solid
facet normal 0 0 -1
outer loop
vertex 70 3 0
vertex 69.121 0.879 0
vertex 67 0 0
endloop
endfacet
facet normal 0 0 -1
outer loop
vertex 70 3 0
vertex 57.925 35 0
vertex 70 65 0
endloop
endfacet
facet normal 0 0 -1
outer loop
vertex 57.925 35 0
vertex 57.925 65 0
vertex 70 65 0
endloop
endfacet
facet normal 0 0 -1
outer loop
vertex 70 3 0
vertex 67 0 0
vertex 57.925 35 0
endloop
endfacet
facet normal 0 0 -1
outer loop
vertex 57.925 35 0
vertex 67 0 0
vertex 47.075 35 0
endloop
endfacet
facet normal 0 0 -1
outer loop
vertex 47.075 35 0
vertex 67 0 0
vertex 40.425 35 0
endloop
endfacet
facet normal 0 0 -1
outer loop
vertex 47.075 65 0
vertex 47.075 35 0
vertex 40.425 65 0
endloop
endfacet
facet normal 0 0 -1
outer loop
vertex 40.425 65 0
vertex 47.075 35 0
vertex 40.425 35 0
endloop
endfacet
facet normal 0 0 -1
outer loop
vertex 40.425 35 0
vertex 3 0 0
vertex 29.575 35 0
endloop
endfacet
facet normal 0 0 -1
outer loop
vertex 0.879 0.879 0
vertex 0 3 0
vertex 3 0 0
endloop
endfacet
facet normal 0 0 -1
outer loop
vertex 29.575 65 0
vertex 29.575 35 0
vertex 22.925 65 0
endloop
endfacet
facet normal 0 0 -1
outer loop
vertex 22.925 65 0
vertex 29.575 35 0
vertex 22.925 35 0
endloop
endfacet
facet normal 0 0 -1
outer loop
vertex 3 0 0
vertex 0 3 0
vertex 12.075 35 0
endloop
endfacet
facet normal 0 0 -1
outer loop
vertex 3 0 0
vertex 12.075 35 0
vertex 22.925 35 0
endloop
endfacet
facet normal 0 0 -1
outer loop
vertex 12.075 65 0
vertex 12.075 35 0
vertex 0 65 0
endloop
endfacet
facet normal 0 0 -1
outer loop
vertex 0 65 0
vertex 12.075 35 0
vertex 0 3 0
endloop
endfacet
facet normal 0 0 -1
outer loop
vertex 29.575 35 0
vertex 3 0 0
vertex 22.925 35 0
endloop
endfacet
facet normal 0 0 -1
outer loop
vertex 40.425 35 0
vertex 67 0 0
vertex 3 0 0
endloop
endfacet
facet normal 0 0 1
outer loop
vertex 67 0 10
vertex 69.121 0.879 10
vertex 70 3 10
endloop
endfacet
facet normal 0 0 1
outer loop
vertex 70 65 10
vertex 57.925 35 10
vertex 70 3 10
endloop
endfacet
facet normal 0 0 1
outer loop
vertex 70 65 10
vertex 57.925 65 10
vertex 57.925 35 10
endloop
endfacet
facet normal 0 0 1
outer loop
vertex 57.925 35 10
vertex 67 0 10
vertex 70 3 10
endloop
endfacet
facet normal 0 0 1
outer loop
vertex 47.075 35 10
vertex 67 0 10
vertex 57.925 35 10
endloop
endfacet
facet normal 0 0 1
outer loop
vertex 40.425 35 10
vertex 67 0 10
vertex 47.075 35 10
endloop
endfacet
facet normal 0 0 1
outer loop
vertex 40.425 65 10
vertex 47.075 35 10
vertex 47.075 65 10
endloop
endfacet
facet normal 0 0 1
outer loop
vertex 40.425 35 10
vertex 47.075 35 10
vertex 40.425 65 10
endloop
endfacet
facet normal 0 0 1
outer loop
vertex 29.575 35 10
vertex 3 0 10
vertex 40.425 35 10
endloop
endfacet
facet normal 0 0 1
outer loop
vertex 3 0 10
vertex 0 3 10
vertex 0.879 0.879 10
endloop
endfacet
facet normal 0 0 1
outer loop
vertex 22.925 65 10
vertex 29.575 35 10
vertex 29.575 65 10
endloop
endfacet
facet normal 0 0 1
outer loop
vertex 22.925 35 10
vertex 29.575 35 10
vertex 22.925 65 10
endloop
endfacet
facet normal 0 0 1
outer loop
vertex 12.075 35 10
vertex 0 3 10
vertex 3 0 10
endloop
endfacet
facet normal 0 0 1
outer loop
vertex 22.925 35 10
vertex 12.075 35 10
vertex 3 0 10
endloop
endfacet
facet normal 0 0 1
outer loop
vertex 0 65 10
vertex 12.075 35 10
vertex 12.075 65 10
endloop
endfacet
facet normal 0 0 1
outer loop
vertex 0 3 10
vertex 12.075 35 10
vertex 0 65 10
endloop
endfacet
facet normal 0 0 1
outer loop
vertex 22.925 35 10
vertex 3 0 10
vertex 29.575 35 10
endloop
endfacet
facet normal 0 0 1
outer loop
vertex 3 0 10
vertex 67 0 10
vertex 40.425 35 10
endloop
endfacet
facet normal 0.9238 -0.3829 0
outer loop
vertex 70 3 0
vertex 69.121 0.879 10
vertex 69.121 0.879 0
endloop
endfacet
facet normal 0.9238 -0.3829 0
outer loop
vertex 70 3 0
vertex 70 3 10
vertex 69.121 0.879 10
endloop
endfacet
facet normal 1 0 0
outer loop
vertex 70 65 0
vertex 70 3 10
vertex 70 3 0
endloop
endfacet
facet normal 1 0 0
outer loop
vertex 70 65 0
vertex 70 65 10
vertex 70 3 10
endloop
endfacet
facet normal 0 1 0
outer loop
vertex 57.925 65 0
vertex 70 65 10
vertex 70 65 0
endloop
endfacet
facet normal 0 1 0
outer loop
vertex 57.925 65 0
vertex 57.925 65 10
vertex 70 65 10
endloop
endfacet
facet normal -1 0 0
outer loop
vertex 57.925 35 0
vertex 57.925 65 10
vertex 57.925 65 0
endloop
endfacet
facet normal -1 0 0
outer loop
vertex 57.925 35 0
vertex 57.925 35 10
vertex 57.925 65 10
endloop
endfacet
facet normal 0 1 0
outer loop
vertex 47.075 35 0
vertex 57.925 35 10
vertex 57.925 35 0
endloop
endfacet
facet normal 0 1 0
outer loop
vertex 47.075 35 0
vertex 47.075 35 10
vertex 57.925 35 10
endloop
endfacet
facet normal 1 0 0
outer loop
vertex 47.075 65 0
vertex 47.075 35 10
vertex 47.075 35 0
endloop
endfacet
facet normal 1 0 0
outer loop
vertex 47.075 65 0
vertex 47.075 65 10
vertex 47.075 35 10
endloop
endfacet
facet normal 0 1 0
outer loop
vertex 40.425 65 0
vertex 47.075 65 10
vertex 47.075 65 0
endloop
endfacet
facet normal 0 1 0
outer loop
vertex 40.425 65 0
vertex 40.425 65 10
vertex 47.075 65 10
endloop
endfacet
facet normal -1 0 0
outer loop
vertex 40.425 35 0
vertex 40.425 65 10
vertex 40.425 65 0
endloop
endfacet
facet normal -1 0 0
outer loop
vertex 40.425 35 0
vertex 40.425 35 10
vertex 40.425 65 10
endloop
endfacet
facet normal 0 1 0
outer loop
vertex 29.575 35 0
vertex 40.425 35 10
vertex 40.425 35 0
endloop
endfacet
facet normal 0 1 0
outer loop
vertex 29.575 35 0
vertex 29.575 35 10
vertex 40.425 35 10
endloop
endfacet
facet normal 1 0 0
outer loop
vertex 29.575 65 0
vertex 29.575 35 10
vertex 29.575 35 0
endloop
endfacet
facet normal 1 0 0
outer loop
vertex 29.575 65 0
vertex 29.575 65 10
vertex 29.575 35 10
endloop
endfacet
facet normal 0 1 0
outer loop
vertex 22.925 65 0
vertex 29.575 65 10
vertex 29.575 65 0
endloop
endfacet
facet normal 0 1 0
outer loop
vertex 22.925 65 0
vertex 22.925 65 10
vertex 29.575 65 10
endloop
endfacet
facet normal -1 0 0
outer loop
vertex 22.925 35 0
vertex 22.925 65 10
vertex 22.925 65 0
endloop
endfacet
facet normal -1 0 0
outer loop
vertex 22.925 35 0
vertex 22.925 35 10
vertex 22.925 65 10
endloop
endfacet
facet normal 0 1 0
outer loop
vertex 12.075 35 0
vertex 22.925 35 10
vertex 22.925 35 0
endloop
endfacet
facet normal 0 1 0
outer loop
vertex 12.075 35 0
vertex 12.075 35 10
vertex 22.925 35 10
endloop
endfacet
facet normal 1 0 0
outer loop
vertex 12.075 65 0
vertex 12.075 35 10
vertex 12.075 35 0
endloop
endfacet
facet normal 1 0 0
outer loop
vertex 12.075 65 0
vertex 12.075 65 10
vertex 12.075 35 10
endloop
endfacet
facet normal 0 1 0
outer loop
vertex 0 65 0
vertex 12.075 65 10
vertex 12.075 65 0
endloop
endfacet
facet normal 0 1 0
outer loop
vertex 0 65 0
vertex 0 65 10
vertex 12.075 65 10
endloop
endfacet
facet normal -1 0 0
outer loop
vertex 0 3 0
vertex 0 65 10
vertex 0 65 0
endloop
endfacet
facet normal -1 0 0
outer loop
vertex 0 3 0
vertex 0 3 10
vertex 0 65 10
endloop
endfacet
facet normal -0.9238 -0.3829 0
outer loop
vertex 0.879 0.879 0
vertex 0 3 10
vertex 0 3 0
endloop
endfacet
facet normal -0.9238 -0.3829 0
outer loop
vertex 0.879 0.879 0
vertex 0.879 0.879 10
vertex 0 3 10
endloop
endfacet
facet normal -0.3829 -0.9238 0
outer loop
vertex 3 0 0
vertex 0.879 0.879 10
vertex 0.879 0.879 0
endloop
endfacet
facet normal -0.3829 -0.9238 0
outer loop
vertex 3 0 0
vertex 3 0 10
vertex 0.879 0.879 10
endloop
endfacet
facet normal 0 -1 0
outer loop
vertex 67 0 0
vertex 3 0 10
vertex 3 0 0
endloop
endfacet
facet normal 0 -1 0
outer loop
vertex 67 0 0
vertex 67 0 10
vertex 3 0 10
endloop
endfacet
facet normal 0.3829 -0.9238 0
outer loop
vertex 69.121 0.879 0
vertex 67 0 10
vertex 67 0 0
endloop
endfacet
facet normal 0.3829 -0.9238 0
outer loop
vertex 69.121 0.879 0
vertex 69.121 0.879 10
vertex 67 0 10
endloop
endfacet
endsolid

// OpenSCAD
$fn = 32;

// ----------------------------------------------------------------------
// Window plate: 70 x 65 mm, 3 open windows
// ----------------------------------------------------------------------

// --- parameters (mm) ---
profile_height = 10;      // extrusion height
profile_points = 20;      // points of the closed outline

profile = [[0, 3], [0.879, 0.879], [3, 0], [67, 0], [69.121, 0.879], [70, 3], [70, 65], [57.925, 65], [57.925, 35], [47.075, 35], [47.075, 65], [40.425, 65], [40.425, 35], [29.575, 35], [29.575, 65], [22.925, 65], [22.925, 35], [12.075, 35], [12.075, 65], [0, 65]];  // single closed polygon, 20 points, counter clockwise

// --- the one profile operation ---
linear_extrude(height = profile_height) polygon(points = profile);
